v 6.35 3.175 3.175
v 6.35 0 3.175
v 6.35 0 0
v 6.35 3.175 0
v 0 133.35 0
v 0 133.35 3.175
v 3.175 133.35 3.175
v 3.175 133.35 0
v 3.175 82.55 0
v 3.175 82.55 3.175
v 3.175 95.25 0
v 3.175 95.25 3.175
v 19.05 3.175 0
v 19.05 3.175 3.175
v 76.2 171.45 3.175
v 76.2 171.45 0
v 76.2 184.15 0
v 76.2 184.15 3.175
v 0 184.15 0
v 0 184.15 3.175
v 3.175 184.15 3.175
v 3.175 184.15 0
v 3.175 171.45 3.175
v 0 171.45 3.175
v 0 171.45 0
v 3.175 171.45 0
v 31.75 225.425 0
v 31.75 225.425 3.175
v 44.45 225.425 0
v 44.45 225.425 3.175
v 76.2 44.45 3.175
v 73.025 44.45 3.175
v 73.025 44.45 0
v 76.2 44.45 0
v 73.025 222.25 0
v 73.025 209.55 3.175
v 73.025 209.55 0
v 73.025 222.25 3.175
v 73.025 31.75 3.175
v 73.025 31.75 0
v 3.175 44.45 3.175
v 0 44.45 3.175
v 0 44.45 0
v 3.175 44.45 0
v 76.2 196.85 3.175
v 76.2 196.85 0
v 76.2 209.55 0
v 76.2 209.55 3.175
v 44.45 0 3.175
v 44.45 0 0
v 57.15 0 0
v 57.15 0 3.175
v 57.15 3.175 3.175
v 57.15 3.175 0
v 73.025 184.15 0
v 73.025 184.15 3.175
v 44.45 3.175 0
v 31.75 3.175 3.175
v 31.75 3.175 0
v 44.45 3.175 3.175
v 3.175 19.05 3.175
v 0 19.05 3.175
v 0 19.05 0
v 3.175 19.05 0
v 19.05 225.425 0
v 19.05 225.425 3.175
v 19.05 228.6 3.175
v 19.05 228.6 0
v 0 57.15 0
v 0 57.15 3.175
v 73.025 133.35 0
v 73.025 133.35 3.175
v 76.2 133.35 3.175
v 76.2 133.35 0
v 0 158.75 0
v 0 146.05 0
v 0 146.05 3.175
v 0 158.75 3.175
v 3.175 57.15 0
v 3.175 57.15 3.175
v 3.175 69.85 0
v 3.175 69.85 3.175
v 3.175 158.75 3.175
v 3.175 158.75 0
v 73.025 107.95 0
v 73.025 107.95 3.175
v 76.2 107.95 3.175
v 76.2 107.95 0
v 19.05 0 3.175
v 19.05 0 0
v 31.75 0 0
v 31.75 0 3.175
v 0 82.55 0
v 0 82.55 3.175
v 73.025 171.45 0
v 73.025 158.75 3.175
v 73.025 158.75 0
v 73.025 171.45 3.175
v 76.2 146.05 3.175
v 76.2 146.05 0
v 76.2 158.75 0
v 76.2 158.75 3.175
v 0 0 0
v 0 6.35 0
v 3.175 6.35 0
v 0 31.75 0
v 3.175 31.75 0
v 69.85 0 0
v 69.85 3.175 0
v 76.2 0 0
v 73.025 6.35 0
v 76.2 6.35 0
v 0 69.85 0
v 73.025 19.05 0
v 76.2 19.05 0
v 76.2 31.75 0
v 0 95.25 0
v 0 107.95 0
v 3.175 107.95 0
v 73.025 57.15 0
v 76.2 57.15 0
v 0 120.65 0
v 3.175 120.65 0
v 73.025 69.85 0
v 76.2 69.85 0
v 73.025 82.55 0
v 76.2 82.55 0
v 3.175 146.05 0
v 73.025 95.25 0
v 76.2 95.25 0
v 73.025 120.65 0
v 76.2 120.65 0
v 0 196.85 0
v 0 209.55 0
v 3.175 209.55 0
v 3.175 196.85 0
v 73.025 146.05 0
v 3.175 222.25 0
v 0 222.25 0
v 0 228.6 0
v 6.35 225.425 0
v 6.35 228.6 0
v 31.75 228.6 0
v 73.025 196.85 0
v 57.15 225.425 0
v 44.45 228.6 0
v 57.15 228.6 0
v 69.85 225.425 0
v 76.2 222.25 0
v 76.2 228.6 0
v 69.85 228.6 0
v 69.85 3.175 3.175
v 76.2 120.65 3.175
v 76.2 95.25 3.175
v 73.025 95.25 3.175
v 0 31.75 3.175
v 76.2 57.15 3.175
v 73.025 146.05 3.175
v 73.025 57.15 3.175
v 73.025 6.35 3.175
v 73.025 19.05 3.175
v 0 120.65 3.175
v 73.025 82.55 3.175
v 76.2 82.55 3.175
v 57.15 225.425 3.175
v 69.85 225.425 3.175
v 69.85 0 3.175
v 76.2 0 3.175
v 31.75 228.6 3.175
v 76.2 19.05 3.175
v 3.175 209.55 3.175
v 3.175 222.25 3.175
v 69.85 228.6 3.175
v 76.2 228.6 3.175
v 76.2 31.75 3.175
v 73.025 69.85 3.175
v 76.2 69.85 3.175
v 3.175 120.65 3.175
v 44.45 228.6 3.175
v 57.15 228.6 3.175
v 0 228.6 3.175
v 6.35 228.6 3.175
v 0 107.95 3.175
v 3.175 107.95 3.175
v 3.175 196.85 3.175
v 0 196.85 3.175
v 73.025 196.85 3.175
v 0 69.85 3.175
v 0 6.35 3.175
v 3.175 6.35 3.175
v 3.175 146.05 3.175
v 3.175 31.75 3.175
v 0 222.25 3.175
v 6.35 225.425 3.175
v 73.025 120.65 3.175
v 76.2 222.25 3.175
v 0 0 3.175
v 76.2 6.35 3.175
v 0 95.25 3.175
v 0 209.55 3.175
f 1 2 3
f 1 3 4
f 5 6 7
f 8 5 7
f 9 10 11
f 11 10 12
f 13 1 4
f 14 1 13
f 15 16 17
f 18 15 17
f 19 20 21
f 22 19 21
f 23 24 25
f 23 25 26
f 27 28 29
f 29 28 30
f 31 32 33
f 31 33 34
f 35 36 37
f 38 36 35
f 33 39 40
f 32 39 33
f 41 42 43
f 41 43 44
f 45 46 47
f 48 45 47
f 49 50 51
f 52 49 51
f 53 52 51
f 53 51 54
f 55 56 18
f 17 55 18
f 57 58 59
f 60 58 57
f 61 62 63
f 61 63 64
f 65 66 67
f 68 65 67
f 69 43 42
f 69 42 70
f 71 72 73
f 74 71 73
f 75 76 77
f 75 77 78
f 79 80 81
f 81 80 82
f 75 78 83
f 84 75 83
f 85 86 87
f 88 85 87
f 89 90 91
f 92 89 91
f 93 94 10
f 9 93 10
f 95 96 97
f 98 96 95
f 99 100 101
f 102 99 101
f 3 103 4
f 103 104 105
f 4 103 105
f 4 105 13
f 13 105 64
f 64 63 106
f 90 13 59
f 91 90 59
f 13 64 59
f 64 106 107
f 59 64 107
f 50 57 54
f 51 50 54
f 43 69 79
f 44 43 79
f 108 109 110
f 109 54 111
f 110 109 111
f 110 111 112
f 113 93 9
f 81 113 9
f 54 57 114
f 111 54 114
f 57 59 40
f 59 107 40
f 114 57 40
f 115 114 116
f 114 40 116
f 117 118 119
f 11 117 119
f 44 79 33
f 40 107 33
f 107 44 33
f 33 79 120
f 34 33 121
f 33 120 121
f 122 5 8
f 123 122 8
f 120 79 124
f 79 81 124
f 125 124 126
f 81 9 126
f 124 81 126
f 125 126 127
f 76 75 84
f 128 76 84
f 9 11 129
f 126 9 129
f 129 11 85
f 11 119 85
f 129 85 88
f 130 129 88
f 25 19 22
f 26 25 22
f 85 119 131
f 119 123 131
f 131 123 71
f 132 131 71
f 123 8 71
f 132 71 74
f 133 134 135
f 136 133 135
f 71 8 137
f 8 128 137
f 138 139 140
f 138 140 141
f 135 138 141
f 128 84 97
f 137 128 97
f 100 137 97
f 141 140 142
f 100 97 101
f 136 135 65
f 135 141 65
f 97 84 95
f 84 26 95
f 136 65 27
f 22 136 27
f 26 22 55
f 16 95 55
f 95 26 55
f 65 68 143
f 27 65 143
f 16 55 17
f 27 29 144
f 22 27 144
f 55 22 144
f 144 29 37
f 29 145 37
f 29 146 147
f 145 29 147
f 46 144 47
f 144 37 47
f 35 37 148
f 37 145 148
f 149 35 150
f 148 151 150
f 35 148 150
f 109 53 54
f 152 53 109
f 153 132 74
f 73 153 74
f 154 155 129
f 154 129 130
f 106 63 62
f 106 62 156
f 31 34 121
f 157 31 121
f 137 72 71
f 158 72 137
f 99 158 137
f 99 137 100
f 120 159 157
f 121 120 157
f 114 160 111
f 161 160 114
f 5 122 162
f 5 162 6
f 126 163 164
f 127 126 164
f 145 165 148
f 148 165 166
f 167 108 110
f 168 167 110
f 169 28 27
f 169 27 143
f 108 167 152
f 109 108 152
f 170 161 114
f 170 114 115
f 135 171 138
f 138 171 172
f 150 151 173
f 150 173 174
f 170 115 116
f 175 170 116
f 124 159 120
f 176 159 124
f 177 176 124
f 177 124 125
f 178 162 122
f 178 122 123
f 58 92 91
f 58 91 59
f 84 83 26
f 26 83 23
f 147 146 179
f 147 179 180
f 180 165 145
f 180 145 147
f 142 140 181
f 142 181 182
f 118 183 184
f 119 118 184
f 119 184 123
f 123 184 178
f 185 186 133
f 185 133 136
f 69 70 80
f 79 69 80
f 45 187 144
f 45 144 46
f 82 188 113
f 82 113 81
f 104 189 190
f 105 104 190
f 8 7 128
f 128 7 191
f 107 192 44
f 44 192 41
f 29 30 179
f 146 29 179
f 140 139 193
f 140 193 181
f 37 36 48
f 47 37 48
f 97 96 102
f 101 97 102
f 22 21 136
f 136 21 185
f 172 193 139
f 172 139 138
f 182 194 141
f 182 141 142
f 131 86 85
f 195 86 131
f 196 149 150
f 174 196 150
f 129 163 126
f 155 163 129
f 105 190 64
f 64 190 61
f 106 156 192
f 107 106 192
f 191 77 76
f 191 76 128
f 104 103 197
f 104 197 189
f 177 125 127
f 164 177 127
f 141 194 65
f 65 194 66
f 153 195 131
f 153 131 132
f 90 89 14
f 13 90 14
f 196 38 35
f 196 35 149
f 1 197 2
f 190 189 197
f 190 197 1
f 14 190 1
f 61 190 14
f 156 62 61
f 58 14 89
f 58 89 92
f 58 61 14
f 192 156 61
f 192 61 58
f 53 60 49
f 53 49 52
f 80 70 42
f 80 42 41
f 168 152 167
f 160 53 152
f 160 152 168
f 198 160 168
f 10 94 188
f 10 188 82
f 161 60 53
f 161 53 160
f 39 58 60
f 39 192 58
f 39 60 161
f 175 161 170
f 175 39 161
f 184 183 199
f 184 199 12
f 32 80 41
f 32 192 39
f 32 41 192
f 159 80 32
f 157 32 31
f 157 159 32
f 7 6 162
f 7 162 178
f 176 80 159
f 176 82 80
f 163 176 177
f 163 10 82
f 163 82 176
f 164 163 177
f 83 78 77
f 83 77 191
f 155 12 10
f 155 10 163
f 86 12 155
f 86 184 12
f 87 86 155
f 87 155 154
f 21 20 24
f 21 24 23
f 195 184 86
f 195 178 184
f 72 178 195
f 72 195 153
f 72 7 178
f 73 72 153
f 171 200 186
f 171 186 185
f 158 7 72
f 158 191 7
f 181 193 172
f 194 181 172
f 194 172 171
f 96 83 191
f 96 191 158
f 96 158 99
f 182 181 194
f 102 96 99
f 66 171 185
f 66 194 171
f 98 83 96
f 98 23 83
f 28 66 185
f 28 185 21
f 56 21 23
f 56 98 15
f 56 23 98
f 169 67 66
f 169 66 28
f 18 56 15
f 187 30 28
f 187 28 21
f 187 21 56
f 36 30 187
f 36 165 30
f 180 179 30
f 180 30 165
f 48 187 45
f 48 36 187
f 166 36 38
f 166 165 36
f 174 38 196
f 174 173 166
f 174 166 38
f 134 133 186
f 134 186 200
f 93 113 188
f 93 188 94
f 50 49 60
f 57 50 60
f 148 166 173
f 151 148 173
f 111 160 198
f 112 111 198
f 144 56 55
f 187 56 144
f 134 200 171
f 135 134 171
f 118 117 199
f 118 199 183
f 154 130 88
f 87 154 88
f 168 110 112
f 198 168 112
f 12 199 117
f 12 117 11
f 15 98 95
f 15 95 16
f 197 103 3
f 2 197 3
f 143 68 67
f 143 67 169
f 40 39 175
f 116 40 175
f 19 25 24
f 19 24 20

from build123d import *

# Parameters (mm, degrees)
SKETCH1_W            = 76.2
SKETCH1_H            = 228.6
EXTRUDE1_DEPTH       = 3.175
SKETCH3_W            = 3.175
SKETCH3_H            = 12.7
CUT_EXTRUDE1_DEPTH   = 3.175
LPATTERN1_COUNT      = 9
LPATTERN1_PITCH      = 25.4
LPATTERN1_COUNT_DIR2 = 2
LPATTERN1_PITCH_DIR2 = 73.025
SKETCH4_W            = 12.7
SKETCH4_H            = 3.175
CUT_EXTRUDE2_DEPTH   = 3.175
LPATTERN2_COUNT      = 3
LPATTERN2_PITCH      = 25.4
LPATTERN2_COUNT_DIR2 = 2
LPATTERN2_PITCH_DIR2 = 225.425


with BuildPart() as part:
    # Sketch1 → Extrude1 (new body)
    with BuildSketch(Plane.XY):
        with Locations((38.1, 114.3)):
            Rectangle(SKETCH1_W, SKETCH1_H)
    extrude(amount=EXTRUDE1_DEPTH)

    # Sketch3 → Cut-Extrude1 (cut)
    with BuildSketch(Plane.XY.offset(3.175)):
        with Locations((74.6125, 215.9)):
            Rectangle(SKETCH3_W, SKETCH3_H)
    cut_extrude1 = extrude(amount=-CUT_EXTRUDE1_DEPTH, mode=Mode.SUBTRACT)

    # LPattern1: Cut-Extrude1 9 × 2
    with Locations(*[(-j * LPATTERN1_PITCH_DIR2, -i * LPATTERN1_PITCH, 0) for i in range(LPATTERN1_COUNT) for j in range(LPATTERN1_COUNT_DIR2) if (i, j) != (0, 0)]):
        add(cut_extrude1, mode=Mode.SUBTRACT)

    # Sketch4 → Cut-Extrude2 (cut)
    with BuildSketch(Plane.XY.offset(3.175)):
        with Locations((63.5, 227.0125)):
            Rectangle(SKETCH4_W, SKETCH4_H)
    cut_extrude2 = extrude(amount=-CUT_EXTRUDE2_DEPTH, mode=Mode.SUBTRACT)

    # LPattern2: Cut-Extrude2 3 × 2
    with Locations(*[(-i * LPATTERN2_PITCH, -j * LPATTERN2_PITCH_DIR2, 0) for i in range(LPATTERN2_COUNT) for j in range(LPATTERN2_COUNT_DIR2) if (i, j) != (0, 0)]):
        add(cut_extrude2, mode=Mode.SUBTRACT)


solid = part.part
